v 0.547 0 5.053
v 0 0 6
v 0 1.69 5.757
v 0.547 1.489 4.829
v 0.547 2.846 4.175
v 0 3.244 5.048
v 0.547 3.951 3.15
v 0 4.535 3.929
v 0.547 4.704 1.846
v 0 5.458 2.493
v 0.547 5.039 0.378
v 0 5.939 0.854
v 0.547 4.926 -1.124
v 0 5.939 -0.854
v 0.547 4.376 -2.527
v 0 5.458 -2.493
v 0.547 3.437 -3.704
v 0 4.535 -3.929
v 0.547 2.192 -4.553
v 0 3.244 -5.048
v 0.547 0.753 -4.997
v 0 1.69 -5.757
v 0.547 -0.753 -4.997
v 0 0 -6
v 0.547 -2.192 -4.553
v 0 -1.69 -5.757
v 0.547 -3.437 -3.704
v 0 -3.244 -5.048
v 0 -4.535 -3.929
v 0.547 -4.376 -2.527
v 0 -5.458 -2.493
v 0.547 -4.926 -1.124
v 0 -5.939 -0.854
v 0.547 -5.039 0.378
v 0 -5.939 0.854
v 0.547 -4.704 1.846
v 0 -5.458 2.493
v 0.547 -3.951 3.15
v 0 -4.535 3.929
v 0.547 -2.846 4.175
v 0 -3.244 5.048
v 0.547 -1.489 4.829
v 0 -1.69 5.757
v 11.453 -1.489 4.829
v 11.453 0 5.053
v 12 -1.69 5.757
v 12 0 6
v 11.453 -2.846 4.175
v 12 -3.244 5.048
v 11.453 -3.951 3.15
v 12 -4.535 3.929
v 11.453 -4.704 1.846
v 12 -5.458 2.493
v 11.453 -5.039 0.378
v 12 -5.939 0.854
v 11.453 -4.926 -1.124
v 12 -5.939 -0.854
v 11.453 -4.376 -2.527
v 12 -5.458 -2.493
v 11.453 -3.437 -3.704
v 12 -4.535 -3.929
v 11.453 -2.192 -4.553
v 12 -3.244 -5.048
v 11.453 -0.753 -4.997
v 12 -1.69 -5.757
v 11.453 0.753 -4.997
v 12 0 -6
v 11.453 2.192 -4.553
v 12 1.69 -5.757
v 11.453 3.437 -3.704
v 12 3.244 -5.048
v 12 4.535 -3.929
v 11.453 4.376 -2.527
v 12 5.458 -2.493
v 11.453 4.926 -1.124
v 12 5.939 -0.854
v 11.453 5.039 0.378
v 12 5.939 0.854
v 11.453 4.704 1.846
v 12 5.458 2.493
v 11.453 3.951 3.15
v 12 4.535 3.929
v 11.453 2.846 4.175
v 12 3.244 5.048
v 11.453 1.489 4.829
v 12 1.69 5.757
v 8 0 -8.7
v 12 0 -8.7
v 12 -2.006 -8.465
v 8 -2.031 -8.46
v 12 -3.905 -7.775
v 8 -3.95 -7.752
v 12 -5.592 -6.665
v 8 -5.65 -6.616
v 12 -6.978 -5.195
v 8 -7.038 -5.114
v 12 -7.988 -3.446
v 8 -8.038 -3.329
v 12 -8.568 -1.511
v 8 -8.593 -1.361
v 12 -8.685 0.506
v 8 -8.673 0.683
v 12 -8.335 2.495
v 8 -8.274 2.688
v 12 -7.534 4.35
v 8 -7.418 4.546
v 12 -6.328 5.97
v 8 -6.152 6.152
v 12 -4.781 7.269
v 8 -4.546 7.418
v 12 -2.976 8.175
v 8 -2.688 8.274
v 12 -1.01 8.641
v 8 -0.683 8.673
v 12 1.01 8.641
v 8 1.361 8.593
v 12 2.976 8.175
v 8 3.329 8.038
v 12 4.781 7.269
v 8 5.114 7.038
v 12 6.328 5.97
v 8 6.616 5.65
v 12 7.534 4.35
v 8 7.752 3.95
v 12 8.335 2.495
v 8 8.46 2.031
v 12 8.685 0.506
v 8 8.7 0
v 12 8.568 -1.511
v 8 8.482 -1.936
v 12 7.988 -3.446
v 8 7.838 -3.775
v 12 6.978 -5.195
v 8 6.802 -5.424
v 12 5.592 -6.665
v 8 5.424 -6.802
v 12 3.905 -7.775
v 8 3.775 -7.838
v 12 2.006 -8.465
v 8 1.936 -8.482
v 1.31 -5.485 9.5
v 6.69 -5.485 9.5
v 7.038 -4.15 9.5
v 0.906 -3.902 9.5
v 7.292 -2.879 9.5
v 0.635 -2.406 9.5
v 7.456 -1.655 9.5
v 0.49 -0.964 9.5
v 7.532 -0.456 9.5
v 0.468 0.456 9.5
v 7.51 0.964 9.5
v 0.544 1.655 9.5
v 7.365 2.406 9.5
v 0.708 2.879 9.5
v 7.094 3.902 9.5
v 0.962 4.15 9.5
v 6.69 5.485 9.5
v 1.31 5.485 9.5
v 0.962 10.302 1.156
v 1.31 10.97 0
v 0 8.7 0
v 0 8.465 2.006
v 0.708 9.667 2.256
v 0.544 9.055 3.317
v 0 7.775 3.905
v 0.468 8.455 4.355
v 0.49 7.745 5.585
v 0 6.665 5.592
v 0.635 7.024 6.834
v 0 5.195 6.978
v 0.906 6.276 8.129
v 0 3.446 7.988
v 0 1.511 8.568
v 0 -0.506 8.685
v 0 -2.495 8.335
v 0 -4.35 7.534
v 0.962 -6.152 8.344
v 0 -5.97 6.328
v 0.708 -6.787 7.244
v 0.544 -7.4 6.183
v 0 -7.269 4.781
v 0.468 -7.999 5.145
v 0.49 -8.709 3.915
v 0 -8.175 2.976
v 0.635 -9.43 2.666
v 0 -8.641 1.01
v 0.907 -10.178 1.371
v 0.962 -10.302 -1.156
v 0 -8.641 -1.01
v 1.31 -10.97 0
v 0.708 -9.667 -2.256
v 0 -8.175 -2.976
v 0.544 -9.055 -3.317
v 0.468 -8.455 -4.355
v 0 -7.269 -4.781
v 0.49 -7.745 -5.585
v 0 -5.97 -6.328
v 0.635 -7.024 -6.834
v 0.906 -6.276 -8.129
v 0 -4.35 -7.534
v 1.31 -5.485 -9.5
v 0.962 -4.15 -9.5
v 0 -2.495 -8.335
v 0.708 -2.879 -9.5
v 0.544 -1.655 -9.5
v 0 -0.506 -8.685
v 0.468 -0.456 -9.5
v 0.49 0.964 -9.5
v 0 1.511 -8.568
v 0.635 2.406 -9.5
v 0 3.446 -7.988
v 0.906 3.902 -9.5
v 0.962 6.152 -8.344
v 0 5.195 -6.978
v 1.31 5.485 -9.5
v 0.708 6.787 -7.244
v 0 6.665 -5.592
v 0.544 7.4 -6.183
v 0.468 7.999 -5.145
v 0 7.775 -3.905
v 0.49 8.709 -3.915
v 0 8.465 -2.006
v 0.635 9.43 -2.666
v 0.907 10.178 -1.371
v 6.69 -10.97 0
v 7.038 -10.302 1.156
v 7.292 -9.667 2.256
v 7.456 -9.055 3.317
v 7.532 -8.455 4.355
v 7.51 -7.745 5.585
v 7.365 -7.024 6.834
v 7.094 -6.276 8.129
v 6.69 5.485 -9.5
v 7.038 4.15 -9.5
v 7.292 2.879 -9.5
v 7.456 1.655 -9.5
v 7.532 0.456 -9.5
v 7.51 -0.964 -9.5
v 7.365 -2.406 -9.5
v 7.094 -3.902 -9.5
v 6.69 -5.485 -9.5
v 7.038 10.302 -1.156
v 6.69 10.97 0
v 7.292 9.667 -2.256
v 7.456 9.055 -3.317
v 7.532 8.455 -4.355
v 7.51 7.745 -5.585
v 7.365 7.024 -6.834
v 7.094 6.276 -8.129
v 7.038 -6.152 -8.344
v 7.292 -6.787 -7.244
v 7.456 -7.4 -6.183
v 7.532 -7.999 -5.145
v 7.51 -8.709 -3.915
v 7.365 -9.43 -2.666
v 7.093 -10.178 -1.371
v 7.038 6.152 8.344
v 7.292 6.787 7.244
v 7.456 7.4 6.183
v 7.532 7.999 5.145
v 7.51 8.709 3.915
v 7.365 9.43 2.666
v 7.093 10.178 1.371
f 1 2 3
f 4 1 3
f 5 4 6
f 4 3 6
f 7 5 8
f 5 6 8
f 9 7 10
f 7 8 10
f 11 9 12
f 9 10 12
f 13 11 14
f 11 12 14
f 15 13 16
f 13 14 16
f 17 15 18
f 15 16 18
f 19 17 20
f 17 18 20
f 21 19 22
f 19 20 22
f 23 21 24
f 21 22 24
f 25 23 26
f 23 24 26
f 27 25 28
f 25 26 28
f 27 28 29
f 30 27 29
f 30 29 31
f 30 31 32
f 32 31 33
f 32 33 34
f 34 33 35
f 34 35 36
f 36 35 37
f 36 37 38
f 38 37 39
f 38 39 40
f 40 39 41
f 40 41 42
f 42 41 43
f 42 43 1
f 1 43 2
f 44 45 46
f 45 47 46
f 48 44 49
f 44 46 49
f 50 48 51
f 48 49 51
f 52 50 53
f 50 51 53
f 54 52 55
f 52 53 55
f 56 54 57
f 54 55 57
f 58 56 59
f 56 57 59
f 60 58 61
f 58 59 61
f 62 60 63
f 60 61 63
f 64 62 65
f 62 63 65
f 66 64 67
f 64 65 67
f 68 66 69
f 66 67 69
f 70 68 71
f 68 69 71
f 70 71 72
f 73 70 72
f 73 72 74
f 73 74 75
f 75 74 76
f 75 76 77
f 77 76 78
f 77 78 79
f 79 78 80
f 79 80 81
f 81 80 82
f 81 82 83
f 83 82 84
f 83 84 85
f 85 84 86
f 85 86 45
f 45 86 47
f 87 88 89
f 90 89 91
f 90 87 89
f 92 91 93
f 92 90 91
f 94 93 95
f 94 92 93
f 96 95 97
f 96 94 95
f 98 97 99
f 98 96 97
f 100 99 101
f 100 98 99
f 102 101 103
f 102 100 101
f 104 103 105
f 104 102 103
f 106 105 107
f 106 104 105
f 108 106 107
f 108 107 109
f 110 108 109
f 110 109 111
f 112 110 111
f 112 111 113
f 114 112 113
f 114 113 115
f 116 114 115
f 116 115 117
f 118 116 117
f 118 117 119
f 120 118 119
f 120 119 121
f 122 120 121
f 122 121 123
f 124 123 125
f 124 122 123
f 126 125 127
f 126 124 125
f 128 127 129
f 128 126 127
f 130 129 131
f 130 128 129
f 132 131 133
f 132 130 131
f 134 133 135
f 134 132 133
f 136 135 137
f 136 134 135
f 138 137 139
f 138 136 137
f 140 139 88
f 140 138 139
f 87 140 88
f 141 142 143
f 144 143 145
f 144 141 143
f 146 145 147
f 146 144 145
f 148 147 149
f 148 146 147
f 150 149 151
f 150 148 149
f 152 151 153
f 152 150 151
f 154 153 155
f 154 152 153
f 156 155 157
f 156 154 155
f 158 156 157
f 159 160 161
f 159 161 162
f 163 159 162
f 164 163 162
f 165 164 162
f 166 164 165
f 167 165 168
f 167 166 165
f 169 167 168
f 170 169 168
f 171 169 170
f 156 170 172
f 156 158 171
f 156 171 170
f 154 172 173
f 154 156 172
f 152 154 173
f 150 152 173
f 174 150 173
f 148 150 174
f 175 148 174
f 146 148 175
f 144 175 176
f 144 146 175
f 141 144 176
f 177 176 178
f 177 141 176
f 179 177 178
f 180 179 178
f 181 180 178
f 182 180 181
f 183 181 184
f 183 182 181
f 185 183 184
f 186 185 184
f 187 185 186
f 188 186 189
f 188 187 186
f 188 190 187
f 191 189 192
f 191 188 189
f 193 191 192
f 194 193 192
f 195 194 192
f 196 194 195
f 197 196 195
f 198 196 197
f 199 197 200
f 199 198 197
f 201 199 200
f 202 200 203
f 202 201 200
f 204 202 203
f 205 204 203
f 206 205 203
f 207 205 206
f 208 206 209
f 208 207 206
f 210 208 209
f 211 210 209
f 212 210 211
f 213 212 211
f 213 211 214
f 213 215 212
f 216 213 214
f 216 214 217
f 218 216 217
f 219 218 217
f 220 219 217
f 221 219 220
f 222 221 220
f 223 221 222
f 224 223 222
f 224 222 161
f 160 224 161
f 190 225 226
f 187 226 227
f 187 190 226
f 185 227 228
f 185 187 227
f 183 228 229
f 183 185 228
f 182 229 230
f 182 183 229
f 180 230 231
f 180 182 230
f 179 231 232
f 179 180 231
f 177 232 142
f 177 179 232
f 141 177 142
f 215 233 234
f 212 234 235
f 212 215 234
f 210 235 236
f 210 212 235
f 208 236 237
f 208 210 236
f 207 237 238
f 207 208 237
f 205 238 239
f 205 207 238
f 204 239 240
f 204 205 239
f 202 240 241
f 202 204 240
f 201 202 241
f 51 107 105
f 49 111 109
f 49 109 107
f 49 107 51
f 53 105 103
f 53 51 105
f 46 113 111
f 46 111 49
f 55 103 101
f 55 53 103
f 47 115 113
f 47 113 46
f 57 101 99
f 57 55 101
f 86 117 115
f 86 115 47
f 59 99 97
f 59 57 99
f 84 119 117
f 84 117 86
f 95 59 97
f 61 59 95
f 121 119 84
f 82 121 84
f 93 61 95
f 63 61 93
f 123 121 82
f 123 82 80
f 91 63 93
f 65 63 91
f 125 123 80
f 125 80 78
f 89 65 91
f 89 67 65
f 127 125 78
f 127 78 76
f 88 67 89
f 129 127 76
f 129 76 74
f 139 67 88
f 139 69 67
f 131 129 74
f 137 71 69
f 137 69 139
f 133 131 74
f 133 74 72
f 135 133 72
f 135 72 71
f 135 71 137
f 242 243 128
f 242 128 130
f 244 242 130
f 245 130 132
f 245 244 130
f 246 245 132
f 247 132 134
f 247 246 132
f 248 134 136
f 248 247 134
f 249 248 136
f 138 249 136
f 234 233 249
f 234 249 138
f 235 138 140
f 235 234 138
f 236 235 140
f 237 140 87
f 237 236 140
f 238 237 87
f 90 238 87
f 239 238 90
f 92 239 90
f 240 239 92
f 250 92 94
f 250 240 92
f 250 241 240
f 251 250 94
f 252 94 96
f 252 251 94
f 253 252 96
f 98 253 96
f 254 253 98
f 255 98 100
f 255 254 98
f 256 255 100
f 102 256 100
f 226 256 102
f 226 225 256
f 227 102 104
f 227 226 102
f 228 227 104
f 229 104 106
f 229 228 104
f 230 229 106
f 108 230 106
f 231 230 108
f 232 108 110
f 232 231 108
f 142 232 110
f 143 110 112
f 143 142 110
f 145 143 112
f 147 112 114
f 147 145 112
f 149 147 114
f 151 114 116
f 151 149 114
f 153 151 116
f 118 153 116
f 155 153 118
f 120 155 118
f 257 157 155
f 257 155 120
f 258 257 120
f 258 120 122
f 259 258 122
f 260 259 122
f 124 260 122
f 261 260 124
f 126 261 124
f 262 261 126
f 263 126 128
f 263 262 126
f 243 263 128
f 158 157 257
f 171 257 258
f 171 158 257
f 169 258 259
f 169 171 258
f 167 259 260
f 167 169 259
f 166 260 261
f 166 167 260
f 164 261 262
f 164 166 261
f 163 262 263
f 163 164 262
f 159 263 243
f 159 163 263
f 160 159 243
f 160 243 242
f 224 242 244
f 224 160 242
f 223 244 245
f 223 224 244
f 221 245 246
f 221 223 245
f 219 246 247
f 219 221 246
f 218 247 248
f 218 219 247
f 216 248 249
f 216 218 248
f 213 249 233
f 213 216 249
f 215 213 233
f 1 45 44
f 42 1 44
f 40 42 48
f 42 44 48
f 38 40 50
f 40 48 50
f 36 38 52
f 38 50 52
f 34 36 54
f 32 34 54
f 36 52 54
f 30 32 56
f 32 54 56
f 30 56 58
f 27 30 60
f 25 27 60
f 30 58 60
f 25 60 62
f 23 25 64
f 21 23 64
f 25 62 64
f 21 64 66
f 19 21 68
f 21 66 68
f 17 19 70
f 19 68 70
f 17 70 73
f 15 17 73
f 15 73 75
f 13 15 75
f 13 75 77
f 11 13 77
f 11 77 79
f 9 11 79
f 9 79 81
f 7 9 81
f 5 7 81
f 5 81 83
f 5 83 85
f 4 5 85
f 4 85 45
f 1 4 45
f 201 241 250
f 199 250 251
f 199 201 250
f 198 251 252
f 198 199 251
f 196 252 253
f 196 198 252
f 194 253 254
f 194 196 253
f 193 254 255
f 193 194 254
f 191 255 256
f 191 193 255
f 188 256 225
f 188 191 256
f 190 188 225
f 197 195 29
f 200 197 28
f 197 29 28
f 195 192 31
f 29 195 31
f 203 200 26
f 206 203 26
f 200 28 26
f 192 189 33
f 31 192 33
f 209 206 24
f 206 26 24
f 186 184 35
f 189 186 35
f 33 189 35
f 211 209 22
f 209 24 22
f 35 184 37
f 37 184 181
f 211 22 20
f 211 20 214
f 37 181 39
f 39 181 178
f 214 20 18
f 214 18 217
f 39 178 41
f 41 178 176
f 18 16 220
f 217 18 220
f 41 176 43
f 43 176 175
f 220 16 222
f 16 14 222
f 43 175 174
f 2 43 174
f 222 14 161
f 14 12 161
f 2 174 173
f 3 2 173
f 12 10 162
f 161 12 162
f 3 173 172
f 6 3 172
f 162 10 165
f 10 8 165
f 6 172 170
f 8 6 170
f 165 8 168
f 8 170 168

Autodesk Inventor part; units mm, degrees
ref_plane "YZ Plane" through (0, 0, 0) normal (1, 0, 0) x (0, 1, 0)
ref_plane "XZ Plane" through (0, 0, 0) normal (0, 1, 0) x (-1, 0, 0)
sketch "Skizze1" plane through (0, 0, 0) normal (1, 0, 0) x (0, 1, 0)
  line L0 (5.4848, -9.5) -> (-5.4848, -9.5)
  line L1 (-5.4848, -9.5) -> (-10.9697, 0)
  line L2 (-10.9697, 0) -> (-5.4848, 9.5)
  line L3 (-5.4848, 9.5) -> (5.4848, 9.5)
  line L4 (5.4848, 9.5) -> (10.9697, 0)
  line L5 (10.9697, 0) -> (5.4848, -9.5)
  point P0 (0, 0)
  point P1 (0, 0)
  dimension "d0" = 21.9393
extrude "Körper" add sketch "Skizze1" along normal blind 8
sketch "Skizze2" plane through (8, 0, 0) normal (1, 0, 0) x (0, 0, -1)
  circle A0 centre (0, 0) radius 8.7
  dimension "d7" = 17.4
extrude "Ring" add sketch "Skizze2" along normal blind 4
sketch "Skizze3" plane through (0, 0, 0) normal (0, 0, 1) x (1, 0, 0)
  line L0 (0, 5.4848) -> (0, 10.9697) projected
  line L1 (0, 10.9697) -> (8, 10.9697) projected
  line L2 (8, 5.4848) -> (8, 10.9697) projected
  line L3 (-1.6, 0) -> (9.6, 0) projected
  line L4 (0, 8.7) -> (1.3104, 10.9697)
  line L5 (6.6896, 10.9697) -> (8, 8.7)
  dimension "d3" = 30
  dimension "d4" = 30
  dimension "d5" = 17.4
  dimension "d6" = 17.4
revolve "Fase1" cut sketch "Skizze3" angle 360 about axis through (-10, 0, 0) along (1, 0, 0)
sketch "Skizze4" plane through (0, 0, 0) normal (-1, 0, 0) x (0, 0, 1)
  line L0 (0, -15.3575) -> (0, 15.3575) projected
  line L1 (-13.3, 0) -> (13.3, 0) projected
  point P0 (0, 0)
hole "Gewinde" at (0, 0, 0) direction (1, 0, 0) diameter 10.106 end through all thread size "M12x1.75" class "6H" standard "ISO Metric profile"
chamfer "Fase2" distance 0.9472 angle 30 1 edges at (0, 0, -5.053) measured on face at (0, 7.3878, -0.897)
chamfer "Fase3" distance 0.9472 angle 30 1 edges at (12, 0, -5.053) measured on face at (12, -1.0971, -7.3511)
ref_plane "Work Plane1" through (31.5112, 0, 0) normal (0, 0, 1) x (-1, 0, 0)
equation "\"d0\" = 1.1547 * SW"
equation "\"d1\" = KOH1"
equation "\"d7\" = SD2"
equation "\"d8\" = KOH - KOH1"
equation "\"d3\" = ANG1"
equation "\"d4\" = ANG2"
equation "\"d5\" = SW0"
equation "\"d6\" = SW01"
equation "\"d10\" = -0.5 * GD1 + 0.5 * NND"
equation "\"d46\" = -0.5 * GD1 + 0.5 * NND"
equation "\"d12\" = -0.5 * GD1 + 0.5 * NND"
equation "\"d47\" = -0.5 * GD1 + 0.5 * NND"
equation "\"ANG1\" = 30deg"
equation "\"ANG2\" = 30deg"
equation "\"NND\" = 12"
equation "\"KOH1\" = 8"
equation "\"KOH\" = 12"
equation "\"SW\" = 19"
equation "\"SW0\" = 17.4"
equation "\"SW01\" = SW0"
equation "\"SD2\" = SW0"
equation "\"GUL\" = 0.541266 * PTC"
equation "\"THREADDIA\" = 12"
equation "\"TOA\" = 30deg"
equation "\"PTC\" = 1.75"
equation "\"GAL\" = 0.541266 * PTC"
equation "\"E0\" = 1.155 * SW"
equation "\"GD1\" = 10.105569"
properties part number "DIN 985 - M12" material "Steel, Mild"
